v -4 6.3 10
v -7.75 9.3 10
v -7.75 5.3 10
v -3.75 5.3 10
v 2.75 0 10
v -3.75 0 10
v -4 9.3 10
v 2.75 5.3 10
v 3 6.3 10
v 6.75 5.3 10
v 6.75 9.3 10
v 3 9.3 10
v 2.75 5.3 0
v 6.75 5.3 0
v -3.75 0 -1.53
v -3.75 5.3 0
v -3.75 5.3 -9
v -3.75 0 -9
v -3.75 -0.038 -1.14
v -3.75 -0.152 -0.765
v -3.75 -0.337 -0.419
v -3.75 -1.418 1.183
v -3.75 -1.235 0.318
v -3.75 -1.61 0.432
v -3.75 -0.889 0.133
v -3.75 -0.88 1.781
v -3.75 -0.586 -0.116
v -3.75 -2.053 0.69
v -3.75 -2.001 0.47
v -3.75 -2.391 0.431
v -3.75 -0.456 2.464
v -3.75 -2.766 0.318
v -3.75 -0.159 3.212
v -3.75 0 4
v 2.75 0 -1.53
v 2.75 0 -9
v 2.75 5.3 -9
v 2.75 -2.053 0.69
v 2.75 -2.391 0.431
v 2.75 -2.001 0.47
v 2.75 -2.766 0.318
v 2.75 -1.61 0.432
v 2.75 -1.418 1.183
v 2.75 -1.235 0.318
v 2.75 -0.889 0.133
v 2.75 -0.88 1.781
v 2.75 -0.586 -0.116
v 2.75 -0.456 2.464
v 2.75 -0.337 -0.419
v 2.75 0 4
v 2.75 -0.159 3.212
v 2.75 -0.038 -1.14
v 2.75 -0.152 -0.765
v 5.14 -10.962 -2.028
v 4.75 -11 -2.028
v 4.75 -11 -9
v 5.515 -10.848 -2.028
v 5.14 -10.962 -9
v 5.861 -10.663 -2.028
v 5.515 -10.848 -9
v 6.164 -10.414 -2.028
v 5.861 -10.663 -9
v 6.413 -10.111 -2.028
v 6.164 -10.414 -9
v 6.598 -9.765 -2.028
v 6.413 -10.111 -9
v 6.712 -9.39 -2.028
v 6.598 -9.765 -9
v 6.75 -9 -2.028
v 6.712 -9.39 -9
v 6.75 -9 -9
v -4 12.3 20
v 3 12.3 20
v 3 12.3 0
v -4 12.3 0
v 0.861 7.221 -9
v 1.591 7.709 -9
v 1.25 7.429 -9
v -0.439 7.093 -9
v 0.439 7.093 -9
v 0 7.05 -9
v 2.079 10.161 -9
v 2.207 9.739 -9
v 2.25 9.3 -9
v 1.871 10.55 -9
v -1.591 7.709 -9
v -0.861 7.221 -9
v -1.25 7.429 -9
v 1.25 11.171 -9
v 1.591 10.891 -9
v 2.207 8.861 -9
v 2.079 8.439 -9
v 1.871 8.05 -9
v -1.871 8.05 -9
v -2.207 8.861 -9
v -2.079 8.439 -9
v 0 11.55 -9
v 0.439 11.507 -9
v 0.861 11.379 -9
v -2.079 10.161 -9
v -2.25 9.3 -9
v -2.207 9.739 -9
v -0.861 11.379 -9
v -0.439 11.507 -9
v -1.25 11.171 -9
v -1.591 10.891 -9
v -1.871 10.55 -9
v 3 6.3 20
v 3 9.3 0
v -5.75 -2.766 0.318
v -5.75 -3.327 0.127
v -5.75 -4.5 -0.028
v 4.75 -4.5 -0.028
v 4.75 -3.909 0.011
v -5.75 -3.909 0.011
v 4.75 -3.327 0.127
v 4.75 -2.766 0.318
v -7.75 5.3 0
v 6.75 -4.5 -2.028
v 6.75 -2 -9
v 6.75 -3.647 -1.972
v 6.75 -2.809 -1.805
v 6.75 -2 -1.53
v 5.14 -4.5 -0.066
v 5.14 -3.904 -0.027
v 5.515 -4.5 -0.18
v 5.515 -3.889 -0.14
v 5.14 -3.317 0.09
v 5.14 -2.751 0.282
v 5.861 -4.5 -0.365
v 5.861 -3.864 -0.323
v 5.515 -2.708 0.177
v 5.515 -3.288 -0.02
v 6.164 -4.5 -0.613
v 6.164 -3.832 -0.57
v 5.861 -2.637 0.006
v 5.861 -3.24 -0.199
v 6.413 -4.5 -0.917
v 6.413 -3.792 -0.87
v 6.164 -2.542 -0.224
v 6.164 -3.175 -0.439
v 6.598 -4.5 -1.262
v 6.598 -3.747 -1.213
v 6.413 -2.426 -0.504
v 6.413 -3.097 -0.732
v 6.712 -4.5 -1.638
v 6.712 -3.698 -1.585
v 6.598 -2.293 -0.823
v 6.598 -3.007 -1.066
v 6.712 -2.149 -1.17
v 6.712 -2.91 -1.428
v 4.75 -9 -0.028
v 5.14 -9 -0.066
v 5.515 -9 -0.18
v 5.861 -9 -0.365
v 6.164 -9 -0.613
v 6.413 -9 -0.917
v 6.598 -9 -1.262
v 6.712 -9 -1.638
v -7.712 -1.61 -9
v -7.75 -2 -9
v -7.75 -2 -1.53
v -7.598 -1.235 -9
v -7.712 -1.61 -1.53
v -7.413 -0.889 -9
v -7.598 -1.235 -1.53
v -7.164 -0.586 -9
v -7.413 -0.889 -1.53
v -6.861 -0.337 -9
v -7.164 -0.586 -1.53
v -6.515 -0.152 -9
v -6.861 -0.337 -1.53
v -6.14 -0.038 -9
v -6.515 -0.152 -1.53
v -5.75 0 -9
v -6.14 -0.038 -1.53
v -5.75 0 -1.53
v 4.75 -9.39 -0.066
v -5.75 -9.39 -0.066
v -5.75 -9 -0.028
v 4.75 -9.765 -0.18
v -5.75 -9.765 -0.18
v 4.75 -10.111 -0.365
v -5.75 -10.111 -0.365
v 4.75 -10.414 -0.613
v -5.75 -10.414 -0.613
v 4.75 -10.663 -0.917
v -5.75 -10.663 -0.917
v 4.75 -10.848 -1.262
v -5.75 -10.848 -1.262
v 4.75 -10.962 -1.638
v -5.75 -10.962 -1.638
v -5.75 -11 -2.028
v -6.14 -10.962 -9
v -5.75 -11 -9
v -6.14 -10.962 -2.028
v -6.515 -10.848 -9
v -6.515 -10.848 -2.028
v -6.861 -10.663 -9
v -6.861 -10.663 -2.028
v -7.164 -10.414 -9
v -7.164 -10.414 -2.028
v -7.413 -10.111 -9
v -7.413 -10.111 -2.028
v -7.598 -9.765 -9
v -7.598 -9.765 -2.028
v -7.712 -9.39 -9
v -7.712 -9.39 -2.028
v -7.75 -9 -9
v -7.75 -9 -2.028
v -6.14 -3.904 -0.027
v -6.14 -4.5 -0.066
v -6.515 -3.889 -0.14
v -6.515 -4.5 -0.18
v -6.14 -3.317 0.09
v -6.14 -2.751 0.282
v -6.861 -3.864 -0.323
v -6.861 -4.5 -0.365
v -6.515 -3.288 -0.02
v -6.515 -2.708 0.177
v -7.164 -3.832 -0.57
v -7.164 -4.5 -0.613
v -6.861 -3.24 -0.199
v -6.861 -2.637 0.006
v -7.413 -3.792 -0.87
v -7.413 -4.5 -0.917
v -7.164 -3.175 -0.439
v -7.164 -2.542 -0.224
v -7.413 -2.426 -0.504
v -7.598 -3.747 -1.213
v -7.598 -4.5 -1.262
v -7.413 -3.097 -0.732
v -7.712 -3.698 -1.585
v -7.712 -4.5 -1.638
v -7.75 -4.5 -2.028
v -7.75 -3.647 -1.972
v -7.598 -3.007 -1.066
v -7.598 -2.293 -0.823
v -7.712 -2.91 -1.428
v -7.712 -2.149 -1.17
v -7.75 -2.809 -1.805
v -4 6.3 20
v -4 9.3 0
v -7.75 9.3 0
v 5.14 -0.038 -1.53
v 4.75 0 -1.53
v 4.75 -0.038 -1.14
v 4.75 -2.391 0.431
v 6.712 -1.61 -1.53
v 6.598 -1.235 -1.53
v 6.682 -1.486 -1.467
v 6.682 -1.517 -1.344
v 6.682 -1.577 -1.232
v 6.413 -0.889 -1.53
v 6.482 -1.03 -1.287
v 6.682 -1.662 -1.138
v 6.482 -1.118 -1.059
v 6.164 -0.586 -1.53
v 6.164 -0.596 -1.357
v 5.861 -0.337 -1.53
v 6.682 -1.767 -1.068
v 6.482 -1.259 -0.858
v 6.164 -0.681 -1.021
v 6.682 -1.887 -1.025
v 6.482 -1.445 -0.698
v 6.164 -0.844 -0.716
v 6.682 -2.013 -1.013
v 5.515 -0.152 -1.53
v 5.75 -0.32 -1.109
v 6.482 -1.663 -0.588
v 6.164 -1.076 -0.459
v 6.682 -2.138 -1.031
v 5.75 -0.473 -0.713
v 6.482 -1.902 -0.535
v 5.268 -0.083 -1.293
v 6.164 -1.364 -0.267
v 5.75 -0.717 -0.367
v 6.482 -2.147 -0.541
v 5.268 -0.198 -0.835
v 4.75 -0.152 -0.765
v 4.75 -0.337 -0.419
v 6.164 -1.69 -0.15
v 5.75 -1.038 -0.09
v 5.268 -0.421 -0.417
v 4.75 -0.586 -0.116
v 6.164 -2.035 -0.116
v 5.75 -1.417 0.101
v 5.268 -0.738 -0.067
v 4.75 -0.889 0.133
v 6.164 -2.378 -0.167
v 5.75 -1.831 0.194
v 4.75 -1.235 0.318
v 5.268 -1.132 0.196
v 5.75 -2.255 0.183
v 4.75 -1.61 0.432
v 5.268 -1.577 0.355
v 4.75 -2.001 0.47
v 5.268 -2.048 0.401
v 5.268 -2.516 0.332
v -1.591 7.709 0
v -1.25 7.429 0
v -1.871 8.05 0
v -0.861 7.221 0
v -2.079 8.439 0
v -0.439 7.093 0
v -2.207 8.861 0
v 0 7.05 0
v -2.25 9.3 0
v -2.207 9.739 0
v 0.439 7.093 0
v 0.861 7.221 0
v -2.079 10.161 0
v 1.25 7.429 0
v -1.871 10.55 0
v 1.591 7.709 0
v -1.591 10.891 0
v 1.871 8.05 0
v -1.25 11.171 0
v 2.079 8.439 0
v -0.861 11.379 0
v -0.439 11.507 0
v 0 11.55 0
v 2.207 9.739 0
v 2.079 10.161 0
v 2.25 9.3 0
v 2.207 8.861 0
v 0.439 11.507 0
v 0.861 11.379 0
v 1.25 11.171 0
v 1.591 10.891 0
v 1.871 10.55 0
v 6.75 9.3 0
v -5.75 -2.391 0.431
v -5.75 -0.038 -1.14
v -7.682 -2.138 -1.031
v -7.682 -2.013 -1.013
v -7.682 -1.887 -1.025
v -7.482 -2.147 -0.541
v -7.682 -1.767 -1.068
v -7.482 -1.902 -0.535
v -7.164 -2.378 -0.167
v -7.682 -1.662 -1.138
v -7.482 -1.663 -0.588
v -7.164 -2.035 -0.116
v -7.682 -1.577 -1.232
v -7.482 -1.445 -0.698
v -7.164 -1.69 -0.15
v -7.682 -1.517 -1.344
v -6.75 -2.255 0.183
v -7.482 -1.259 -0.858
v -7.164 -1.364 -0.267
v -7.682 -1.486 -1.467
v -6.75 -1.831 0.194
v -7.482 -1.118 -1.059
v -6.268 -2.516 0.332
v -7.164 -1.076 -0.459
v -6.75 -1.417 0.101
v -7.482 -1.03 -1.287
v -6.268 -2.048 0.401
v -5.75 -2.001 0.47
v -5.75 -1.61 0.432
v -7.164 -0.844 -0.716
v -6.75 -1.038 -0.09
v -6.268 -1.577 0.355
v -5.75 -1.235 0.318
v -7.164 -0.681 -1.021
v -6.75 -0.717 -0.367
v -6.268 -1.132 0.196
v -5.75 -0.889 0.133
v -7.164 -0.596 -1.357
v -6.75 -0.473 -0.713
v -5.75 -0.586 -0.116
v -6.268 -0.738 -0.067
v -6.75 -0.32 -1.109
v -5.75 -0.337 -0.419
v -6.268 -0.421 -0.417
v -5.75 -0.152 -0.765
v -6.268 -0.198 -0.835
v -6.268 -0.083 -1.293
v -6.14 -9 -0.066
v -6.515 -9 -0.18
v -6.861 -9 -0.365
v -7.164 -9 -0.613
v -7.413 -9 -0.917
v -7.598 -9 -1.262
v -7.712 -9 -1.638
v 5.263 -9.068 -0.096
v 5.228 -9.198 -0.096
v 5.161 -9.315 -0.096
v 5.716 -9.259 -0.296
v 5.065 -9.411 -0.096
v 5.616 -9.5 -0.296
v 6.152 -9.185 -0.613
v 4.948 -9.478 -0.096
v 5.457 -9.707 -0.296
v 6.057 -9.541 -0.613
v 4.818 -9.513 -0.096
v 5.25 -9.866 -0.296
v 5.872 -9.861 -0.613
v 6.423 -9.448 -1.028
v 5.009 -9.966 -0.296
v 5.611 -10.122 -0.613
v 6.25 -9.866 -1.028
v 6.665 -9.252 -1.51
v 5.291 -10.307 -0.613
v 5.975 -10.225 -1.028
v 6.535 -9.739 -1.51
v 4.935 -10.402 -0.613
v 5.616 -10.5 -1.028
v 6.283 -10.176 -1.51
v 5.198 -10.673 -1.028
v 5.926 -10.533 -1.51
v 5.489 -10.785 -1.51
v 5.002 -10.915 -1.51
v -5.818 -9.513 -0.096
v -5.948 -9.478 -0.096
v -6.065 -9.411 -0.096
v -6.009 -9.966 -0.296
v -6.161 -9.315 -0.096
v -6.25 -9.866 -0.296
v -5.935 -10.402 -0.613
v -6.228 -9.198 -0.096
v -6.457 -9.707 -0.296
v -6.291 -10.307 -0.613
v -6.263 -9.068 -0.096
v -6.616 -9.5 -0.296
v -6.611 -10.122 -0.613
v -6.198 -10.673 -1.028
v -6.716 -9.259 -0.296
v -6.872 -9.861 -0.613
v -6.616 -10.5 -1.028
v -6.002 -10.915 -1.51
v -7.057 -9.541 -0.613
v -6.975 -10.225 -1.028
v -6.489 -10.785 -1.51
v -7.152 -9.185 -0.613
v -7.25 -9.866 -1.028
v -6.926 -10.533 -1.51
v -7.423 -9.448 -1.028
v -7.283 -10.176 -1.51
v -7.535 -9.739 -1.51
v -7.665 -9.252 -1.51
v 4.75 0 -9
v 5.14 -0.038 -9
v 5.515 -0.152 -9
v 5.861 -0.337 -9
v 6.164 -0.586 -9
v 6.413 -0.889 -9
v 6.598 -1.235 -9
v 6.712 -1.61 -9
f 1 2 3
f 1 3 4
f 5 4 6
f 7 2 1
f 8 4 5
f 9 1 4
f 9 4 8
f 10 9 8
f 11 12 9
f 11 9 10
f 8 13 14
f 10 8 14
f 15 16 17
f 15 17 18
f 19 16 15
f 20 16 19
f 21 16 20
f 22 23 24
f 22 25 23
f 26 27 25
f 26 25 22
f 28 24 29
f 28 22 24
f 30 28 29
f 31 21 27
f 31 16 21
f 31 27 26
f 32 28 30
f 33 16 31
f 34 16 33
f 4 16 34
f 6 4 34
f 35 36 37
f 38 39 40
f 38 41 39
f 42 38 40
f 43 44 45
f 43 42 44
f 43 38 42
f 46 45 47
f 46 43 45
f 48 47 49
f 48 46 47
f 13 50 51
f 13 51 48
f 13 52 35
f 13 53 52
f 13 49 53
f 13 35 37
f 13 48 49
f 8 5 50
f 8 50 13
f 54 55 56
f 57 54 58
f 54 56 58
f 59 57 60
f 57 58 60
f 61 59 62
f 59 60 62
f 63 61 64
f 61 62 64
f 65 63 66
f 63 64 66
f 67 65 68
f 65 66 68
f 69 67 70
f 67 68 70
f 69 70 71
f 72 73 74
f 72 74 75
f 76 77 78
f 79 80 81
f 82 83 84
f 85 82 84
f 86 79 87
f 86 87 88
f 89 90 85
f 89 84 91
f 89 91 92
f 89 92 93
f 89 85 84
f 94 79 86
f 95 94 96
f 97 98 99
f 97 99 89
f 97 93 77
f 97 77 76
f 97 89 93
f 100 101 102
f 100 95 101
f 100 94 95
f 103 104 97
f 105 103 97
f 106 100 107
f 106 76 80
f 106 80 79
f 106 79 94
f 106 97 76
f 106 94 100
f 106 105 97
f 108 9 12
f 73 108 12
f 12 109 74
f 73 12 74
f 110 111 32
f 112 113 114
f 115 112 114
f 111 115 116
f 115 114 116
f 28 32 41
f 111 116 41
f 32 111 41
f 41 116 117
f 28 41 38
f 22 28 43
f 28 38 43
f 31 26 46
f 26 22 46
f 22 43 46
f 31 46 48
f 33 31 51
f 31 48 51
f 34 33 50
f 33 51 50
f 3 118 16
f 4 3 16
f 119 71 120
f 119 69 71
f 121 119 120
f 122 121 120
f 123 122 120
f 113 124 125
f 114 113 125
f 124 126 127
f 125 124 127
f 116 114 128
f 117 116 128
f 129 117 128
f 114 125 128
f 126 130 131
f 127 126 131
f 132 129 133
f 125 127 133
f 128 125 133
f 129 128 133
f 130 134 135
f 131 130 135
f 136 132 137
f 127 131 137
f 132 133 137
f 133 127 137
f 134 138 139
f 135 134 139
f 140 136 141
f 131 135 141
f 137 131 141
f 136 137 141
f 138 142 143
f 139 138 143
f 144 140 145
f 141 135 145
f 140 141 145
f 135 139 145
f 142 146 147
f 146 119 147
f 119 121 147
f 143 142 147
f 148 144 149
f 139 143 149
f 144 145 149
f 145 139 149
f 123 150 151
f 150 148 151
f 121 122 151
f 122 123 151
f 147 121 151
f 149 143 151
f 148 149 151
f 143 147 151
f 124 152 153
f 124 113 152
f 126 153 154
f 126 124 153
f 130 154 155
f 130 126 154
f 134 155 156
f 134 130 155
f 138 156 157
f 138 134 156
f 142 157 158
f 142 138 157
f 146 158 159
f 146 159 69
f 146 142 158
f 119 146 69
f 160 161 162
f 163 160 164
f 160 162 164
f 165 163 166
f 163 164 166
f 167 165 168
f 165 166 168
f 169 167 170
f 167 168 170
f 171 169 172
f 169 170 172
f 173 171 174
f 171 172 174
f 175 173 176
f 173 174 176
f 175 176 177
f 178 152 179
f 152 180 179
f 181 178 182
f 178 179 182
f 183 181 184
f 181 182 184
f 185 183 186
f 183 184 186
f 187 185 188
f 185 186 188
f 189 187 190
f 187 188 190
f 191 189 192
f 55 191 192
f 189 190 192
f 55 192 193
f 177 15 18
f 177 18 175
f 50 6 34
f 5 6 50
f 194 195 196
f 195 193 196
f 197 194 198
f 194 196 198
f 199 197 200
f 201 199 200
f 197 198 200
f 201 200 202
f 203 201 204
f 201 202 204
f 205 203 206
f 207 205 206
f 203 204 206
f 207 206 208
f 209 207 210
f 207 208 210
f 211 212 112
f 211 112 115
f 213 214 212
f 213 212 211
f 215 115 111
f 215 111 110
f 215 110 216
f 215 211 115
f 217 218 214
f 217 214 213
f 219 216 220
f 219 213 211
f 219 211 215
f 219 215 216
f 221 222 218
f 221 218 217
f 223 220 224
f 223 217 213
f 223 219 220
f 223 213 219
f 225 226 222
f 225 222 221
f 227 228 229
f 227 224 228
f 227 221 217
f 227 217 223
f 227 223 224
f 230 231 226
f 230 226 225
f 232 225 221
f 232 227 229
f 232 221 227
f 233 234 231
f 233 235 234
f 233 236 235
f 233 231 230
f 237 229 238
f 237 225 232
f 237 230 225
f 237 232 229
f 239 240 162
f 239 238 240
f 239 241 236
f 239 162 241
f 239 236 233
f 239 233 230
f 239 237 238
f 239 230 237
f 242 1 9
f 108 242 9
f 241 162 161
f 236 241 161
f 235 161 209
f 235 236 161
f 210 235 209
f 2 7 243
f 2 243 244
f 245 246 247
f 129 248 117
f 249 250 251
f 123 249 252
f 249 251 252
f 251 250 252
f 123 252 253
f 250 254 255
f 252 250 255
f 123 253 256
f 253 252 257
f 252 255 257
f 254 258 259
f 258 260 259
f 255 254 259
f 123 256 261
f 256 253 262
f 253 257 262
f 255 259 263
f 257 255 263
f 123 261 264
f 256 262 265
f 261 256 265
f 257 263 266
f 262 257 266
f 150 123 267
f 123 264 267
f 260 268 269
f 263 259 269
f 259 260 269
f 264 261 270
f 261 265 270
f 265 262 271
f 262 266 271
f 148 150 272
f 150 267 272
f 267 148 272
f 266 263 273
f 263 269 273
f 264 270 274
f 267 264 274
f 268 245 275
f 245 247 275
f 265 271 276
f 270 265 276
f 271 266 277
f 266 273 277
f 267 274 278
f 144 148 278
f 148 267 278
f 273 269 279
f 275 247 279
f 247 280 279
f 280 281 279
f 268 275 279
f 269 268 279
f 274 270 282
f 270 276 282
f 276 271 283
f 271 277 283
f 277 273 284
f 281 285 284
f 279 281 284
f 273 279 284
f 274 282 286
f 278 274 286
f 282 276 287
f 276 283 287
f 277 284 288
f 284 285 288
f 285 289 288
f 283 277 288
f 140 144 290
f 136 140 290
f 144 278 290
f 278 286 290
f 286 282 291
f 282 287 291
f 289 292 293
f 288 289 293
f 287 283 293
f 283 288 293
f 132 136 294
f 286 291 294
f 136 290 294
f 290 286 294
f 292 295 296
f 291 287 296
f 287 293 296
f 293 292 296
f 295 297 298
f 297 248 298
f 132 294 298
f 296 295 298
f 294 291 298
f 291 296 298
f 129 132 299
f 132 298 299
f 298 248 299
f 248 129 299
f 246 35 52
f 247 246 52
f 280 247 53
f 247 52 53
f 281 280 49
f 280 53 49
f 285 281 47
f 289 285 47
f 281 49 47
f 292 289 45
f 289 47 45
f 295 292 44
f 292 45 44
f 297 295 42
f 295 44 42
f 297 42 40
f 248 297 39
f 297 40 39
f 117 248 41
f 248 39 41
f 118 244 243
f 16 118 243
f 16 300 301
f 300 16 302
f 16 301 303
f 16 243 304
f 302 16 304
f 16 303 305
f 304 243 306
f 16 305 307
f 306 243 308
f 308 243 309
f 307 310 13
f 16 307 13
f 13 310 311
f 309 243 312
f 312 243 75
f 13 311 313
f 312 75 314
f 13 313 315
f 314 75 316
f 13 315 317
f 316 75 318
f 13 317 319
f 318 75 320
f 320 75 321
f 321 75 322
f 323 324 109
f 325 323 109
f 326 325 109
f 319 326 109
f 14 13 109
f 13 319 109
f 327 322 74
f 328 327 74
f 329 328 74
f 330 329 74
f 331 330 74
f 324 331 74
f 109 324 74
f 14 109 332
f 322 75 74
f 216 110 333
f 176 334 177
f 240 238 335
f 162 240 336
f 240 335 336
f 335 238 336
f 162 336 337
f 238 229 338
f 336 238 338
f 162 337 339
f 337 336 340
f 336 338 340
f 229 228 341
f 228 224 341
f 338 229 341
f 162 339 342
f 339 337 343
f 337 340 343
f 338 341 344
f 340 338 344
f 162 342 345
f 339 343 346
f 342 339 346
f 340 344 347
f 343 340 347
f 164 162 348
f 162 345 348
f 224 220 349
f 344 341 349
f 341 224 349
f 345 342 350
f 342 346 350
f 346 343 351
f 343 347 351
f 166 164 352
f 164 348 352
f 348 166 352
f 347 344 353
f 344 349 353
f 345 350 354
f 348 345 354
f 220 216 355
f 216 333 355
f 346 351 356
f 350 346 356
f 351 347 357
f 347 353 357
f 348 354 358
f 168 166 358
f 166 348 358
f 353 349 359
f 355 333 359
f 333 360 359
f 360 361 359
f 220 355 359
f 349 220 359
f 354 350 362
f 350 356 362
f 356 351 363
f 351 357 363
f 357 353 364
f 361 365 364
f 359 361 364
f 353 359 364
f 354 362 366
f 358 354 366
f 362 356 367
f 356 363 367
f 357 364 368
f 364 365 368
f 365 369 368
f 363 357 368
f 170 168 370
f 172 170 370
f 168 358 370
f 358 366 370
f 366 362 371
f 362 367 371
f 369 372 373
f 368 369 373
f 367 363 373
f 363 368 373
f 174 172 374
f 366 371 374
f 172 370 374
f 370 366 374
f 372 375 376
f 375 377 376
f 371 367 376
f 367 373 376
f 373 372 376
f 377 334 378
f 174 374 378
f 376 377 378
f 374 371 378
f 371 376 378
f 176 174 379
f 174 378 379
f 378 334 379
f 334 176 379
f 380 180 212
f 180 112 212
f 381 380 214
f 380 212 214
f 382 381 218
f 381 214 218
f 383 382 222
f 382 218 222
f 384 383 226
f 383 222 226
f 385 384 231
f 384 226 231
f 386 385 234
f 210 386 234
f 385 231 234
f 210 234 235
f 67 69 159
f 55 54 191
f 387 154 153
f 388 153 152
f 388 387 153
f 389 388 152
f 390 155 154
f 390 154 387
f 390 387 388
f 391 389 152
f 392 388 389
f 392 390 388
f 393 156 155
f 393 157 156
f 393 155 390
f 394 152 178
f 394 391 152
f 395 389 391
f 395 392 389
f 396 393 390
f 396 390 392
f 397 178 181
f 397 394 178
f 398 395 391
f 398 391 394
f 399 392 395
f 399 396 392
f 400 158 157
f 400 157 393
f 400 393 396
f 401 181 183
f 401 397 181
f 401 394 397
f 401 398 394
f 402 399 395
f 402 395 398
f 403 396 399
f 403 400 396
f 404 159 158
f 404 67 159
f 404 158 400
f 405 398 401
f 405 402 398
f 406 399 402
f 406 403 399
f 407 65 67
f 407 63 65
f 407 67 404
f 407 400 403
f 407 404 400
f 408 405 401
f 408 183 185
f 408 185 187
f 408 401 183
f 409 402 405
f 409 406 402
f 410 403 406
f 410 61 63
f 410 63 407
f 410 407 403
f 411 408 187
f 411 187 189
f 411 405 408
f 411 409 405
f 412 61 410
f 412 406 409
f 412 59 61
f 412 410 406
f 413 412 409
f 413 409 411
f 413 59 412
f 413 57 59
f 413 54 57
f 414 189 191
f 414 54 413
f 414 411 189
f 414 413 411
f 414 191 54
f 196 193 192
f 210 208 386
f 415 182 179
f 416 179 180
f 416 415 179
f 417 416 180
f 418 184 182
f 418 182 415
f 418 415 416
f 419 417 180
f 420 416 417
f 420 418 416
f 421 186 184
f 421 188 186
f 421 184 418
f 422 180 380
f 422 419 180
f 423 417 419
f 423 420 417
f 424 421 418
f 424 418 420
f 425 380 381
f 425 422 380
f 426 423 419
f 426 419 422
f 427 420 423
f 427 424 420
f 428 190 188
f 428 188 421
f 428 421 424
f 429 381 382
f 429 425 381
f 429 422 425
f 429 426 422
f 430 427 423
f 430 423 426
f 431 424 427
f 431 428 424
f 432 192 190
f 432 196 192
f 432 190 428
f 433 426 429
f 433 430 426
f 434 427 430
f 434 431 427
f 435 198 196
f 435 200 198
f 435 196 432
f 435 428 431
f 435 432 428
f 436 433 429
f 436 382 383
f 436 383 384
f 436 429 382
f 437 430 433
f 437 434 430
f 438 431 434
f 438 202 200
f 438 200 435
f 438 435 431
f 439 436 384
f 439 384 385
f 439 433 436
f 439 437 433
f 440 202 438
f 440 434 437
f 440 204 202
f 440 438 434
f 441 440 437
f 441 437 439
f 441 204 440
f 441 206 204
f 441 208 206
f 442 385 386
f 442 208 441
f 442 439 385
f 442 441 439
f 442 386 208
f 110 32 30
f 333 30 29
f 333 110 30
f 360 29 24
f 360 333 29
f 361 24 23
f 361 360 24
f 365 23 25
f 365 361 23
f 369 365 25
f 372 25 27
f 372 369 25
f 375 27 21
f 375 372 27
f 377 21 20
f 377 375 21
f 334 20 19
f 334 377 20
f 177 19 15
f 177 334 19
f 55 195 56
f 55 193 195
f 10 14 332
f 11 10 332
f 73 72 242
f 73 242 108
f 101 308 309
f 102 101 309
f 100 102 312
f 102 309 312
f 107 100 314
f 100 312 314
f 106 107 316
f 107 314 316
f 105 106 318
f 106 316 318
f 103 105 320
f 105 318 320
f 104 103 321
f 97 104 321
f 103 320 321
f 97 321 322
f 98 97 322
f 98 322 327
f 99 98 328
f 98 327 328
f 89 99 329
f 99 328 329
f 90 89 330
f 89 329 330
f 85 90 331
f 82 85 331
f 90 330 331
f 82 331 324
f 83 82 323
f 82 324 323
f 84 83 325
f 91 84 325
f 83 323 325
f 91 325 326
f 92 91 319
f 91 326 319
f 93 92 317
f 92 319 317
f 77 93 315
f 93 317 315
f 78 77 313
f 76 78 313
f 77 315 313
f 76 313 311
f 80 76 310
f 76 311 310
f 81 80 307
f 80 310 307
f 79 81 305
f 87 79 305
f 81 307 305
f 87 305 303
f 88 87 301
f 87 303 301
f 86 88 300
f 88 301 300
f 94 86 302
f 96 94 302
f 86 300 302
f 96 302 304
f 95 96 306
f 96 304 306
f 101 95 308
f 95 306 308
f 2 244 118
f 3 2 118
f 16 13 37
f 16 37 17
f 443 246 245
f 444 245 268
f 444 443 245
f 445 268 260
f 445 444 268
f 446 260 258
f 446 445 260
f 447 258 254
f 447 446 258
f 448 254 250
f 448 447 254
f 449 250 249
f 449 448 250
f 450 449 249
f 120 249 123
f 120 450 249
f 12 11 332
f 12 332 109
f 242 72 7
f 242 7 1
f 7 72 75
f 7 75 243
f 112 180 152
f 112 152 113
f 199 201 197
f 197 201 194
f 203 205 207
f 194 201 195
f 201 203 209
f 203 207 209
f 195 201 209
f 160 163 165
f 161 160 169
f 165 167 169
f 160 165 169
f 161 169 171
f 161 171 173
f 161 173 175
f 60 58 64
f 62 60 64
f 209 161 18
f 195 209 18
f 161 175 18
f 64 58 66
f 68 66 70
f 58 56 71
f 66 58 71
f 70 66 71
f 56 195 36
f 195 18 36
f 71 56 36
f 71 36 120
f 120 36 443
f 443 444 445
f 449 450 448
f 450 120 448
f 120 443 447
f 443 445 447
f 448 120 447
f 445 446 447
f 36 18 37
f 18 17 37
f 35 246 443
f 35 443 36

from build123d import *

# Parameters (mm, degrees)
BOSS_EXTRUDE1_DEPTH = 10
SKETCH3_W           = 14.5
SKETCH3_H           = 11
CUT_EXTRUDE2_DEPTH  = 2
BOSS_EXTRUDE2_DEPTH = 10
SKETCH2_R           = 2.25
BOSS_EXTRUDE4_DEPTH = 9
CUT_EXTRUDE5_DEPTH  = 28.596014205
FILLET1_R           = 2


with BuildPart() as part:
    # Sketch1 → Boss-Extrude1 (new body)
    with BuildSketch(Plane.XY):
        Polygon((2.75, 0), (2.75, 5.3), (6.75, 5.3), (6.75, 9.3), (3, 9.3), (3, 12.3), (-4, 12.3), (-4, 9.3), (-7.75, 9.3), (-7.75, 5.3), (-3.75, 5.3), (-3.75, 0), (-7.75, 0), (-7.75, -11), (6.75, -11), (6.75, 0), align=None)
    extrude(amount=BOSS_EXTRUDE1_DEPTH)

    # Sketch3 → Cut-Extrude2 (cut)
    with BuildSketch(Plane.XY.offset(10)):
        with Locations((-0.5, -5.5)):
            Rectangle(SKETCH3_W, SKETCH3_H)
    extrude(amount=-CUT_EXTRUDE2_DEPTH, mode=Mode.SUBTRACT)

    # Sketch4 → Boss-Extrude2 (add)
    with BuildSketch(Plane.XY.offset(10)):
        Polygon((3, 9.3), (3, 12.3), (-4, 12.3), (-4, 9.3), (-4, 6.3), (3, 6.3), align=None)
    extrude(amount=BOSS_EXTRUDE2_DEPTH)

    # Sketch2 → Boss-Extrude4 (add)
    with BuildSketch(Plane(origin=(0, 0, 0), x_dir=(-1, 0, 0), z_dir=(0, 0, -1))):
        with Locations((0, 9.3)):
            Circle(SKETCH2_R)
        Polygon((-2.75, 0), (-2.75, 5.3), (3.75, 5.3), (3.75, 0), (7.75, 0), (7.75, -11), (-6.75, -11), (-6.75, 0), align=None)
    extrude(amount=BOSS_EXTRUDE4_DEPTH)

    # Sketch6 → Cut-Extrude5 (cut, through all)
    with BuildSketch(Plane(origin=(6.75, 0, 0), x_dir=(0, 0, -1), z_dir=(1, 0, 0))):
        with BuildLine():
            Line((-4, 0), (-8, 0))
            Line((-8, 0), (-8, -11))
            Line((-8, -11), (0.027692569, -11))
            Line((0.027692569, -11), (0.027692569, -4.5))
            ThreePointArc((0.027692569, -4.5), (-1.12628941, -1.480384651), (-4, 0))
        make_face()
    extrude(amount=-CUT_EXTRUDE5_DEPTH, mode=Mode.SUBTRACT)

    # Fillet1
    fillet1_edges = [part.edges().sort_by_distance(p)[0] for p in [
        (6.75, 0, -2.5),
        (6.75, -11, -4.513846285),
        (-7.75, -11, -4.513846285),
        (-7.75, 0, -2.5),
        (6.75, -1.480384651, 1.12628941),
        (-5.75, 0, 4),
        (4.75, 0, 4),
        (6.75, -7.75, -0.027692569),
        (-0.5, -11, -0.027692569),
        (-7.75, -1.480384651, 1.12628941),
        (-7.75, -7.75, -0.027692569),
    ]]
    fillet(fillet1_edges, radius=FILLET1_R)


solid = part.part
